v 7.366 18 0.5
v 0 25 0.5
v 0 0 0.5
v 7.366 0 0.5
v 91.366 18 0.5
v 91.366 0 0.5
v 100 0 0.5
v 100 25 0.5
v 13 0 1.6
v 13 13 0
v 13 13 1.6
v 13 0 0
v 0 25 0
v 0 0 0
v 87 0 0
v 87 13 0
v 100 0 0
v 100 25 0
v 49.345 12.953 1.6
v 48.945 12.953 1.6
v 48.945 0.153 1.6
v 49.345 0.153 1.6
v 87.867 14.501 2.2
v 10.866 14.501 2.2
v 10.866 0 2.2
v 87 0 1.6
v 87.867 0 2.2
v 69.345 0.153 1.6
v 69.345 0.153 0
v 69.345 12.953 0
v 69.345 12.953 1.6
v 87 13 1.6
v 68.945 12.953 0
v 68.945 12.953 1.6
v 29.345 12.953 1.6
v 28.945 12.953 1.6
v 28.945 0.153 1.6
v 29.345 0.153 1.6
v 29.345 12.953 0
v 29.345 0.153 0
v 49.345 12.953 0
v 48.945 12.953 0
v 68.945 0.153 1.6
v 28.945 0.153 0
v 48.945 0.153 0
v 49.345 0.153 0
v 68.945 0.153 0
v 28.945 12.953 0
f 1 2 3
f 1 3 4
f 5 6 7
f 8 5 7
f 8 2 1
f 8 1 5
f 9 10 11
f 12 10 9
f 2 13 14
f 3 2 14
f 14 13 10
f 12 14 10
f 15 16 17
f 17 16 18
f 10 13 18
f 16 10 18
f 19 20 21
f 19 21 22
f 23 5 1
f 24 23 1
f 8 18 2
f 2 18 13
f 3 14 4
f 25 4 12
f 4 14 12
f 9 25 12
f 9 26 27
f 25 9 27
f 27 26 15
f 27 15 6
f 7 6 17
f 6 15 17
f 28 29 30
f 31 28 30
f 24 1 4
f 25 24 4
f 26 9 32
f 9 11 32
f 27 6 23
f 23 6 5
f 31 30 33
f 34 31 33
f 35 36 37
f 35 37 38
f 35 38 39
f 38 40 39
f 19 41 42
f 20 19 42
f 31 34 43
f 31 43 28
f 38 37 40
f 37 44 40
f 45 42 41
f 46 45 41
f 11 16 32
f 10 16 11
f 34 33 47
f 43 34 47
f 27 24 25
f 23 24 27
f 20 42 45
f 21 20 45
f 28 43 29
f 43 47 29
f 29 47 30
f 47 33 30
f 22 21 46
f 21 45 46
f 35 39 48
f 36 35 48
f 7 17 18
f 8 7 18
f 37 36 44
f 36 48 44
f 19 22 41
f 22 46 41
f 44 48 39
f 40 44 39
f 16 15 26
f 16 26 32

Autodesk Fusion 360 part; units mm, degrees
sketch "Skizze2" plane through (0, 0, 0) normal (0, 0, 1) x (1, 0, 0)
  line L0 (0, 0) -> (100, 0)
  line L1 (100, 0) -> (100, 25)
  line L2 (100, 25) -> (0, 25)
  line L3 (0, 25) -> (0, 0)
  line L4 (13, 0) -> (87, 0)
  line L5 (87, 0) -> (87, 13)
  line L6 (87, 13) -> (13, 13)
  line L7 (13, 13) -> (13, 0)
  line L8 (7.3663, 0) -> (91.3663, 0)
  line L9 (91.3663, 0) -> (91.3663, 18)
  line L10 (91.3663, 18) -> (7.3663, 18)
  line L11 (7.3663, 18) -> (7.3663, 0)
  dimension "d1" = 100
  dimension "d2" = 25
  dimension "d3" = 74
  dimension "d4" = 13
  dimension "d5" = 13
  dimension "d6" = 84
  dimension "d7" = 18
extrude "Extrusion1" add sketch "Skizze2" along normal blind 0.5 contours L0 L1 L2 L3 L9 L10 L11 makes body 1
extrude "Extrusion2" add sketch "Skizze2" along normal blind 2.2 contours L0 L5 L6 L7 L8 L9 L10 L11 bodies 1
extrude "Extrusion3" add sketch "Skizze2" along normal blind 0.6 from surface at 1.6 contours L0 L4 L5 L6 L7 L8 bodies 1
chamfer "Fase1" distance 3.5 distance2 1.7 1 edges at (91.3663, 9, 2.2) measured on face at (35.3663, 6, 2.2) on bodies 1
chamfer "Fase2" distance 3.5 distance2 1.7 1 edges at (47.6163, 18, 2.2) measured on face at (34.1999, 6, 2.2) on bodies 1
chamfer "Fase3" distance 3.5 distance2 1.7 1 edges at (7.3663, 7.25, 2.2) measured on face at (34.1999, 4.8336, 2.2) on bodies 1
sketch "Skizze3" plane through (0, 0, 0) normal (0, 0, 1) x (1, 0, 0)
  line L0 (49.3454, 12.9531) -> (48.9454, 12.9531)
  line L1 (48.9454, 12.9531) -> (48.9454, 0.1531)
  line L2 (48.9454, 0.1531) -> (49.3454, 0.1531)
  line L3 (49.3454, 0.1531) -> (49.3454, 12.9531)
  line L4 (29.3454, 12.9531) -> (28.9454, 12.9531)
  line L5 (29.3454, 0.1531) -> (29.3454, 12.9531)
  line L6 (28.9454, 12.9531) -> (28.9454, 0.1531)
  line L7 (28.9454, 0.1531) -> (29.3454, 0.1531)
  line L8 (69.3454, 12.9531) -> (68.9454, 12.9531)
  line L9 (69.3454, 0.1531) -> (69.3454, 12.9531)
  line L10 (68.9454, 12.9531) -> (68.9454, 0.1531)
  line L11 (68.9454, 0.1531) -> (69.3454, 0.1531)
  dimension "d21" = 0.4
  dimension "d22" = 12.8
  dimension "d29" = 0
  dimension "d30" = 0
  dimension "d33" = 20
  dimension "d34" = 0
extrude "Extrusion4" add sketch "Skizze3" along normal blind 1.6 separate body makes body 2 at (29.3454, 4.4198, 0.5333) makes body 3 at (49.3454, 4.4198, 0.5333) makes body 4 at (69.3454, 4.4198, 0.5333)
